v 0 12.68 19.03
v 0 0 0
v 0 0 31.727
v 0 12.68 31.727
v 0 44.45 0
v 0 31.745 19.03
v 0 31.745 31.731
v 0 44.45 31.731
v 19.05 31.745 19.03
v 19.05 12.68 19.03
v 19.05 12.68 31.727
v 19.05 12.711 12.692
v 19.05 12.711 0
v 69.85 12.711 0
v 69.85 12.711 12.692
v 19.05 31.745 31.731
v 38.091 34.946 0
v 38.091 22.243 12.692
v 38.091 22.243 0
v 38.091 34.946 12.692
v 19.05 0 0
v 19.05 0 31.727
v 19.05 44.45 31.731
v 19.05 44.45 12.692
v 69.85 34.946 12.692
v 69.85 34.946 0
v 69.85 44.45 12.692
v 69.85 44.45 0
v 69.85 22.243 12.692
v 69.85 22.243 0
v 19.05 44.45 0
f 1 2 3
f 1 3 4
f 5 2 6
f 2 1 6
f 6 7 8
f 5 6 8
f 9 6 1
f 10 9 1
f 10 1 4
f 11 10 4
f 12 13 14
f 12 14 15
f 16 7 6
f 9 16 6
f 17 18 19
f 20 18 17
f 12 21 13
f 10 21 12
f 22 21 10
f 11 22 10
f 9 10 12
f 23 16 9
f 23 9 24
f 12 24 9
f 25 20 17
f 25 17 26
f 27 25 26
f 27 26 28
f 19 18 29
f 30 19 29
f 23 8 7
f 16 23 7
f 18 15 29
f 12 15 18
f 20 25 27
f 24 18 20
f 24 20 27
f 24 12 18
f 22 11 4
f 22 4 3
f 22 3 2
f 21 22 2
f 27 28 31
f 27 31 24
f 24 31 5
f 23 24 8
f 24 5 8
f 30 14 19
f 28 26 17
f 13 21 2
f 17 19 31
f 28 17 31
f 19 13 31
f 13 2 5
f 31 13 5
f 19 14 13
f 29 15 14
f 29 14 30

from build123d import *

# Parameters (mm, degrees)
F1_DEPTH = 19.05
F2_W     = 31.7388475657
F2_H     = 12.6919411123
F3_DEPTH = 50.8
F4_W     = 31.7593351066
F4_H     = 12.702934444
F5_DEPTH = 25.4


with BuildPart() as f1:
    # F0 (on Right) → F1 (new body)
    with BuildSketch(Plane.YZ):
        Polygon((0, 31.7267506936), (0, 0), (44.45, 0), (44.45, 31.7312787083), (31.7450927711, 31.7312787083), (31.7450927711, 19.0298414173), (12.6803467474, 19.0298414173), (12.6803467474, 31.7267506936), align=None)
    extrude(amount=F1_DEPTH)

    # F2 (on face) → F3 (join)
    with BuildSketch(Plane.YZ.offset(19.05)):
        with Locations((28.5805762172, 6.3459705561)):
            Rectangle(F2_W, F2_H)
    extrude(amount=F3_DEPTH)

    # F4 (on face) → F5 (cut)
    with BuildSketch(Plane.XY.offset(12.6919411123)):
        with Locations((53.9703324467, 28.594661504)):
            Rectangle(F4_W, F4_H)
    extrude(amount=-F5_DEPTH, mode=Mode.SUBTRACT)


solid = f1.part
